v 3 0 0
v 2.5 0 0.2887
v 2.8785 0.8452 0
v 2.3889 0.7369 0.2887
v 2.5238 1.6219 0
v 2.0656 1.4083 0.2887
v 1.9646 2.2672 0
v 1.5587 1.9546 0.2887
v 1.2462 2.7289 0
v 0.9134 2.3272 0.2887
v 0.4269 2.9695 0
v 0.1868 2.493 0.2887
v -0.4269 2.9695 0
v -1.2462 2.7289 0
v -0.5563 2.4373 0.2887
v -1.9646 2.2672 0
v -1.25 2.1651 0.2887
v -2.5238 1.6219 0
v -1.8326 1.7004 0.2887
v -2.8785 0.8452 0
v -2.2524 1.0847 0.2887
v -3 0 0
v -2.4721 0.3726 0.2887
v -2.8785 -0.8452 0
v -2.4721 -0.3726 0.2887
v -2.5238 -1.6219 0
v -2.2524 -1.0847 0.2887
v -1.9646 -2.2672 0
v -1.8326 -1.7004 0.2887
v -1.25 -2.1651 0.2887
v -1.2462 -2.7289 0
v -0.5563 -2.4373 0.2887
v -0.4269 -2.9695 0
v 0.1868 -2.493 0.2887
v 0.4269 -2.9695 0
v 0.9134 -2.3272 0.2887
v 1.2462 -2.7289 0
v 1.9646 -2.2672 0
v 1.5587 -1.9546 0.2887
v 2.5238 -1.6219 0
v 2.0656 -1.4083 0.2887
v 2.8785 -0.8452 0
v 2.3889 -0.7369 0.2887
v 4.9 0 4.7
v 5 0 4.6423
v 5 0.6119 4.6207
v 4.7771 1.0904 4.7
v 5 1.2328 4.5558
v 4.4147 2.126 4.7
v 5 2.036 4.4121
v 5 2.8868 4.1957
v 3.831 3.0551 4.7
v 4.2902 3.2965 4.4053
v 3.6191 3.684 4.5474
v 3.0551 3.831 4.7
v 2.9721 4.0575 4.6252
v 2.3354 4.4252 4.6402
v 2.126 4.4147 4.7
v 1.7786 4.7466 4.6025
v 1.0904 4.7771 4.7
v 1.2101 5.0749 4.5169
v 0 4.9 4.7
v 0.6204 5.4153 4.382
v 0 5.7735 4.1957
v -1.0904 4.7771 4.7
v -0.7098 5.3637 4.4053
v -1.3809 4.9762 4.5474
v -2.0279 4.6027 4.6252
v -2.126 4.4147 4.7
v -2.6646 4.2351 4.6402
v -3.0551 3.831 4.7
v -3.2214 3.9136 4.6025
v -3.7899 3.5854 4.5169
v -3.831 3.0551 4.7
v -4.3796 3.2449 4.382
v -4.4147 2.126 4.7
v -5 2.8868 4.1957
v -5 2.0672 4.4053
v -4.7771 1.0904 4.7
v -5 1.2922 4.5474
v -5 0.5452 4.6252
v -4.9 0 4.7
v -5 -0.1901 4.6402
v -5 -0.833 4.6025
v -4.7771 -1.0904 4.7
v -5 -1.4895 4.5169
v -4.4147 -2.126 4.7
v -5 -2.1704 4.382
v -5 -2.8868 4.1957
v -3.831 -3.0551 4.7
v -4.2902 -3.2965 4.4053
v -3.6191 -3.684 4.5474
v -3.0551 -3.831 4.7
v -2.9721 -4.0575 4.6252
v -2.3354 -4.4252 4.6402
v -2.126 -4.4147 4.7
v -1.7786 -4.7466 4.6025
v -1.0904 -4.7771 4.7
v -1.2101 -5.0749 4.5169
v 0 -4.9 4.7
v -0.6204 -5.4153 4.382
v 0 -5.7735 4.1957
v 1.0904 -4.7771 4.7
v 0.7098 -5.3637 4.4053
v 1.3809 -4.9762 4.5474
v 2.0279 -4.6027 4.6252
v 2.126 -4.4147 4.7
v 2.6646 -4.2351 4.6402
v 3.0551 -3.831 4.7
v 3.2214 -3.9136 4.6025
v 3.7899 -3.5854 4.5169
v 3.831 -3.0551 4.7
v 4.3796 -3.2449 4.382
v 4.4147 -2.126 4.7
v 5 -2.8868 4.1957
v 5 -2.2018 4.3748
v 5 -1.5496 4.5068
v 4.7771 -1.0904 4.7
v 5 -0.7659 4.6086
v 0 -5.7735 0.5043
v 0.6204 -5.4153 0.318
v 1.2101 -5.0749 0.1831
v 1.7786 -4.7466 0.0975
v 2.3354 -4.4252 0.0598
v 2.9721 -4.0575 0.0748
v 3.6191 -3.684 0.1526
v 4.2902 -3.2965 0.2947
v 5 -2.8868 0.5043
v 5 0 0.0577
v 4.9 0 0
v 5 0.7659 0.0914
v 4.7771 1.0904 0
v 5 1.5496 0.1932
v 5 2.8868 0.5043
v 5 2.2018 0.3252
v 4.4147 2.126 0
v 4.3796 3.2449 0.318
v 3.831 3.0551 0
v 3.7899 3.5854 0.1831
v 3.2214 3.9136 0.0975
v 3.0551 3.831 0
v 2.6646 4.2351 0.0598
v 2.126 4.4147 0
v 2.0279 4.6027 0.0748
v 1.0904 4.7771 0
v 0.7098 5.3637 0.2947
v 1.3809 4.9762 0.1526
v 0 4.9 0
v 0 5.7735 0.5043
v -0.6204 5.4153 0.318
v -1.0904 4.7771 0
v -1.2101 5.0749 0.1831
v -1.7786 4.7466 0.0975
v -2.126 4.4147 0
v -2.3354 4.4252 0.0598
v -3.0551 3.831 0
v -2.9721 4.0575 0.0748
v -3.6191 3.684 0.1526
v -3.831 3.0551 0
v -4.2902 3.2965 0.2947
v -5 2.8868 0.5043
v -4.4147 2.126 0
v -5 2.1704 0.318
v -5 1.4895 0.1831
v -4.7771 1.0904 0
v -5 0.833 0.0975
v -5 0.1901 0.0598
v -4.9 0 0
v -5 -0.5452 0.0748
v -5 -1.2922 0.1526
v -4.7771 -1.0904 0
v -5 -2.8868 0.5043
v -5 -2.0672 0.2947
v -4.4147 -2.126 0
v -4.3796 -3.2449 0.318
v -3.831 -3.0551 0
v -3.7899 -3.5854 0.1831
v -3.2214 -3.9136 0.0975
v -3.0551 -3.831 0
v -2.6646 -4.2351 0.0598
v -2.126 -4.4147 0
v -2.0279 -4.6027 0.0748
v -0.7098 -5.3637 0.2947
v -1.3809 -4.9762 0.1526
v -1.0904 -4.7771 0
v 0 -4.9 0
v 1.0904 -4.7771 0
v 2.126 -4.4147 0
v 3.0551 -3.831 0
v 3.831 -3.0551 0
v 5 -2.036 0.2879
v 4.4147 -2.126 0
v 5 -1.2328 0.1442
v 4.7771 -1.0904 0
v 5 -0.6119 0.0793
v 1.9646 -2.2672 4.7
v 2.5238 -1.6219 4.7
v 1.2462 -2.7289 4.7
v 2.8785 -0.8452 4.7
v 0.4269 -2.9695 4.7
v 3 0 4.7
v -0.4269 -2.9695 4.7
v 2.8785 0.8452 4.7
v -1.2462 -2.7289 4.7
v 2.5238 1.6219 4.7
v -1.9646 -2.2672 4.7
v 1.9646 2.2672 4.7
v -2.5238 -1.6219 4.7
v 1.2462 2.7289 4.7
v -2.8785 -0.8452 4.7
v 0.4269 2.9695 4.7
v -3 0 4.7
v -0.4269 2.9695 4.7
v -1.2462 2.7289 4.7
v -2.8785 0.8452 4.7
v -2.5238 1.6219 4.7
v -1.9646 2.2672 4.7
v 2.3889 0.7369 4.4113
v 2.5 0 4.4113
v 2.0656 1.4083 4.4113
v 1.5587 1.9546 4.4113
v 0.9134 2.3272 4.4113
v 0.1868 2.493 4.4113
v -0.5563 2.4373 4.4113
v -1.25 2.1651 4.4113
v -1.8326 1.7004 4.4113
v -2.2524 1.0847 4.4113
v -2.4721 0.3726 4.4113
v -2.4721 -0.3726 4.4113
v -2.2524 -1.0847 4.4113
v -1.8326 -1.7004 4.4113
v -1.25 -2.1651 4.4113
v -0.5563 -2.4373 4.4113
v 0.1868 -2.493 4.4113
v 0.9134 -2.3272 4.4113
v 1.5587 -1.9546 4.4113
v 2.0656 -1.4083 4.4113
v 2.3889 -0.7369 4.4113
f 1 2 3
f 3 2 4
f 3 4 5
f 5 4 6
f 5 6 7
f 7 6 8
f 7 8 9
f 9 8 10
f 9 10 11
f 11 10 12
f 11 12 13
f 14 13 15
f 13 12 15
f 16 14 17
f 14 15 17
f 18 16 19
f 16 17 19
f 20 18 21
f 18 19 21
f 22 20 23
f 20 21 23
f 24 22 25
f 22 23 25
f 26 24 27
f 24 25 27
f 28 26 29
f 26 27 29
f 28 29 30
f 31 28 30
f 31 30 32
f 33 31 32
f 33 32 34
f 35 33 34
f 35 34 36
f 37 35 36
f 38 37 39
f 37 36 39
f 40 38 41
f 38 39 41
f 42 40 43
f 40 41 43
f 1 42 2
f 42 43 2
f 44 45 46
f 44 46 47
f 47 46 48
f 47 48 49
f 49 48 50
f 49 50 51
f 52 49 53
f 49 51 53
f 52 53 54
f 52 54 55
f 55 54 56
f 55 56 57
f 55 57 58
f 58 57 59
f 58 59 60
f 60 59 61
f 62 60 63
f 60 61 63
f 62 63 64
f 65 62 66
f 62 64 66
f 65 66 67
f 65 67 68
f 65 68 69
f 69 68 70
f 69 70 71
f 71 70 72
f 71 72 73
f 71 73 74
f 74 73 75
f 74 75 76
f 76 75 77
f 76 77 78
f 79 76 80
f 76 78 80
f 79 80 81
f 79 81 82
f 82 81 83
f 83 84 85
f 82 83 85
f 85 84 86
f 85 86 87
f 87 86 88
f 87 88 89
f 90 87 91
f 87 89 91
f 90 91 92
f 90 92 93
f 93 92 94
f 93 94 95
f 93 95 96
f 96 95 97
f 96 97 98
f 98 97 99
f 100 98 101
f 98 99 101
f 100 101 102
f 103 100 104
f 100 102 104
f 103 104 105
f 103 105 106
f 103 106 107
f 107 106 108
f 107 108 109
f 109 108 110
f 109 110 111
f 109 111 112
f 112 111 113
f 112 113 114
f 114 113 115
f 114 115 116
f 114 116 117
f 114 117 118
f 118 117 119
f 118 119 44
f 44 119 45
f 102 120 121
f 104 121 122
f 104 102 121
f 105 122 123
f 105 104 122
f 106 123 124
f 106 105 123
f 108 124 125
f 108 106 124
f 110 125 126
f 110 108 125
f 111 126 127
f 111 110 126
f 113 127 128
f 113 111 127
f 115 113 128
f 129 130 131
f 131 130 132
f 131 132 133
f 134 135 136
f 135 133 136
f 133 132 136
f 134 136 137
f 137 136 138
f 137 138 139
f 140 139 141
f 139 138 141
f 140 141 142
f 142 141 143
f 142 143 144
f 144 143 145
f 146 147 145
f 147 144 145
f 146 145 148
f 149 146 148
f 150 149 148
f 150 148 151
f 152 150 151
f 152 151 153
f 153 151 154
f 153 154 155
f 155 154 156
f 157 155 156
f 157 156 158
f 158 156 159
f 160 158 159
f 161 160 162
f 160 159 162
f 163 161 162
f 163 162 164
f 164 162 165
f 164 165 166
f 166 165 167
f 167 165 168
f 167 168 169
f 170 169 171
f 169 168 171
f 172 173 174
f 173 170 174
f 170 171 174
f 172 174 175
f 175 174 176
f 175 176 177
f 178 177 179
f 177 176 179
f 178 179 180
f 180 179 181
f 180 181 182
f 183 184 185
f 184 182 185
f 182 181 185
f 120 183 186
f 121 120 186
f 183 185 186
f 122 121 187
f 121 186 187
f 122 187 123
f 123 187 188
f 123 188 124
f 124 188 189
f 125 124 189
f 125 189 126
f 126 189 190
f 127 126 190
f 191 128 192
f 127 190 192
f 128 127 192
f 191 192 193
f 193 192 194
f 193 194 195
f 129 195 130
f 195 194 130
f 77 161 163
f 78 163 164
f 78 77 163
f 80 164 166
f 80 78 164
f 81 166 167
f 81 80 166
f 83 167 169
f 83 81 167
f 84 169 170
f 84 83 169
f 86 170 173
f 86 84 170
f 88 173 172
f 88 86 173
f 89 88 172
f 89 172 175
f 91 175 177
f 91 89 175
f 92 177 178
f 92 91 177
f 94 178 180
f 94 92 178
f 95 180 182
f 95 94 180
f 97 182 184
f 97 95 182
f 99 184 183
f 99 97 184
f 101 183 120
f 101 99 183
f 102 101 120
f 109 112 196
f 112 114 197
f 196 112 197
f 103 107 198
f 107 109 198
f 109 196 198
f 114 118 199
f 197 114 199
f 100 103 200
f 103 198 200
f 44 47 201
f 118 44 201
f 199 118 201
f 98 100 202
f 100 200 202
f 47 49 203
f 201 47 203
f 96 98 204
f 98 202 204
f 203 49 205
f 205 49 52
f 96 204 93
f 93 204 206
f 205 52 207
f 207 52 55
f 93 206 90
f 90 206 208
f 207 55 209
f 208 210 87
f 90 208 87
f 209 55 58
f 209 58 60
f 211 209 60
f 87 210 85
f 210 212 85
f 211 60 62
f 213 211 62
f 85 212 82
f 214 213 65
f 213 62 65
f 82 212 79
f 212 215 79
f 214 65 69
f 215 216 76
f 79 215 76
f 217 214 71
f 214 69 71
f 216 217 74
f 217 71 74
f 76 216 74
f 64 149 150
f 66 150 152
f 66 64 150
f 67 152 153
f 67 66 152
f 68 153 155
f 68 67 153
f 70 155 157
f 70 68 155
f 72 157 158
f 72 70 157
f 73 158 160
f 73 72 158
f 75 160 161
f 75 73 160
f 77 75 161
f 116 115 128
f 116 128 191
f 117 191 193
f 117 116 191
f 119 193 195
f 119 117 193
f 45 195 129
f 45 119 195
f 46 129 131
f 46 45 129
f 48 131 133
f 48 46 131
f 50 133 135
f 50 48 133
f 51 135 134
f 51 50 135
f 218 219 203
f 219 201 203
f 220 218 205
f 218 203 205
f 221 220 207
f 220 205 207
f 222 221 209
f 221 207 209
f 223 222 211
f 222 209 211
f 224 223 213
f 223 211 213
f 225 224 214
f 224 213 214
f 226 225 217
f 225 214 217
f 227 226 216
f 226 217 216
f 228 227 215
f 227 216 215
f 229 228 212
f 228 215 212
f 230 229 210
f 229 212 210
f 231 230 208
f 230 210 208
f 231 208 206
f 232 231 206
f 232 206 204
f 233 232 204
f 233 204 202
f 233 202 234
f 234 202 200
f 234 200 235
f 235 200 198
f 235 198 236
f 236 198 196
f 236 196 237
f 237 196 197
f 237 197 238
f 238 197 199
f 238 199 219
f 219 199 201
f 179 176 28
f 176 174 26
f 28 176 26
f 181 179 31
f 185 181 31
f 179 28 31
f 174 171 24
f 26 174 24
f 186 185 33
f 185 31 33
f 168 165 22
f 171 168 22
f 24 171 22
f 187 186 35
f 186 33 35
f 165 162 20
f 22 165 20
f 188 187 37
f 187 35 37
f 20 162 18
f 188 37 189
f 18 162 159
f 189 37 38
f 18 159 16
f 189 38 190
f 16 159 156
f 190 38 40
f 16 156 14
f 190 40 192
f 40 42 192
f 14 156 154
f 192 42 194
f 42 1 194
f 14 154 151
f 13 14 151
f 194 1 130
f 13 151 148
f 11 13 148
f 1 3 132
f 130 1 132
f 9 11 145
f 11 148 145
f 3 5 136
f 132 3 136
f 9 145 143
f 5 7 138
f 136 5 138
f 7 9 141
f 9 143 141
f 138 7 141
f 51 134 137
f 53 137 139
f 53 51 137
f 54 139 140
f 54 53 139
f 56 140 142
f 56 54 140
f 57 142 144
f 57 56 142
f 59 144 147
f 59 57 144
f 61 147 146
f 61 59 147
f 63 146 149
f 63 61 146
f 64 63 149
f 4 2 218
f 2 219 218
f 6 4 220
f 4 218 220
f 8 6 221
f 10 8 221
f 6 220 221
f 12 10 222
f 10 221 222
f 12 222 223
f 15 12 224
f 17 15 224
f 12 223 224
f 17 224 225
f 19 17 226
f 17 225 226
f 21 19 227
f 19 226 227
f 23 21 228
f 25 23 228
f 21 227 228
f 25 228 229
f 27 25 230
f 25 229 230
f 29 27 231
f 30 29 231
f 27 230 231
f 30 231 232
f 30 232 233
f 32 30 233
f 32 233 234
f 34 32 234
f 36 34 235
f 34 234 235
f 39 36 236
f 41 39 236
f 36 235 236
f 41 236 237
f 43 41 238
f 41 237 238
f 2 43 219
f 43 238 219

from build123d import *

# Parameters (mm, degrees)
SKETCH001_R  = 7
POCKET_DEPTH = 4.701


with BuildPart() as part:
    # Sketch → Revolution (revolve)
    with BuildSketch(Plane.XZ):
        Polygon((3, 0), (2.5, 0.288675), (2.5, 4.411325), (3, 4.7), (4.9, 4.7), (6, 4.064915), (6, 0.635085), (4.9, 0), align=None)
    revolve(axis=Axis((0, 0, 0), (0, 0, 1)))

    # Sketch001 → Pocket (cut, through all)
    with BuildSketch(Plane(origin=(0, 0, 4.7), x_dir=(-1, 0, 0), z_dir=(0, 0, 1))):
        with Locations((0.052409, -0.034939)):
            Circle(SKETCH001_R)
        Polygon((5, -2.886751), (5, 2.886751), (0, 5.773503), (-5, 2.886751), (-5, -2.886751), (0, -5.773503), align=None, mode=Mode.SUBTRACT)
    extrude(amount=-POCKET_DEPTH, mode=Mode.SUBTRACT)


solid = part.part
